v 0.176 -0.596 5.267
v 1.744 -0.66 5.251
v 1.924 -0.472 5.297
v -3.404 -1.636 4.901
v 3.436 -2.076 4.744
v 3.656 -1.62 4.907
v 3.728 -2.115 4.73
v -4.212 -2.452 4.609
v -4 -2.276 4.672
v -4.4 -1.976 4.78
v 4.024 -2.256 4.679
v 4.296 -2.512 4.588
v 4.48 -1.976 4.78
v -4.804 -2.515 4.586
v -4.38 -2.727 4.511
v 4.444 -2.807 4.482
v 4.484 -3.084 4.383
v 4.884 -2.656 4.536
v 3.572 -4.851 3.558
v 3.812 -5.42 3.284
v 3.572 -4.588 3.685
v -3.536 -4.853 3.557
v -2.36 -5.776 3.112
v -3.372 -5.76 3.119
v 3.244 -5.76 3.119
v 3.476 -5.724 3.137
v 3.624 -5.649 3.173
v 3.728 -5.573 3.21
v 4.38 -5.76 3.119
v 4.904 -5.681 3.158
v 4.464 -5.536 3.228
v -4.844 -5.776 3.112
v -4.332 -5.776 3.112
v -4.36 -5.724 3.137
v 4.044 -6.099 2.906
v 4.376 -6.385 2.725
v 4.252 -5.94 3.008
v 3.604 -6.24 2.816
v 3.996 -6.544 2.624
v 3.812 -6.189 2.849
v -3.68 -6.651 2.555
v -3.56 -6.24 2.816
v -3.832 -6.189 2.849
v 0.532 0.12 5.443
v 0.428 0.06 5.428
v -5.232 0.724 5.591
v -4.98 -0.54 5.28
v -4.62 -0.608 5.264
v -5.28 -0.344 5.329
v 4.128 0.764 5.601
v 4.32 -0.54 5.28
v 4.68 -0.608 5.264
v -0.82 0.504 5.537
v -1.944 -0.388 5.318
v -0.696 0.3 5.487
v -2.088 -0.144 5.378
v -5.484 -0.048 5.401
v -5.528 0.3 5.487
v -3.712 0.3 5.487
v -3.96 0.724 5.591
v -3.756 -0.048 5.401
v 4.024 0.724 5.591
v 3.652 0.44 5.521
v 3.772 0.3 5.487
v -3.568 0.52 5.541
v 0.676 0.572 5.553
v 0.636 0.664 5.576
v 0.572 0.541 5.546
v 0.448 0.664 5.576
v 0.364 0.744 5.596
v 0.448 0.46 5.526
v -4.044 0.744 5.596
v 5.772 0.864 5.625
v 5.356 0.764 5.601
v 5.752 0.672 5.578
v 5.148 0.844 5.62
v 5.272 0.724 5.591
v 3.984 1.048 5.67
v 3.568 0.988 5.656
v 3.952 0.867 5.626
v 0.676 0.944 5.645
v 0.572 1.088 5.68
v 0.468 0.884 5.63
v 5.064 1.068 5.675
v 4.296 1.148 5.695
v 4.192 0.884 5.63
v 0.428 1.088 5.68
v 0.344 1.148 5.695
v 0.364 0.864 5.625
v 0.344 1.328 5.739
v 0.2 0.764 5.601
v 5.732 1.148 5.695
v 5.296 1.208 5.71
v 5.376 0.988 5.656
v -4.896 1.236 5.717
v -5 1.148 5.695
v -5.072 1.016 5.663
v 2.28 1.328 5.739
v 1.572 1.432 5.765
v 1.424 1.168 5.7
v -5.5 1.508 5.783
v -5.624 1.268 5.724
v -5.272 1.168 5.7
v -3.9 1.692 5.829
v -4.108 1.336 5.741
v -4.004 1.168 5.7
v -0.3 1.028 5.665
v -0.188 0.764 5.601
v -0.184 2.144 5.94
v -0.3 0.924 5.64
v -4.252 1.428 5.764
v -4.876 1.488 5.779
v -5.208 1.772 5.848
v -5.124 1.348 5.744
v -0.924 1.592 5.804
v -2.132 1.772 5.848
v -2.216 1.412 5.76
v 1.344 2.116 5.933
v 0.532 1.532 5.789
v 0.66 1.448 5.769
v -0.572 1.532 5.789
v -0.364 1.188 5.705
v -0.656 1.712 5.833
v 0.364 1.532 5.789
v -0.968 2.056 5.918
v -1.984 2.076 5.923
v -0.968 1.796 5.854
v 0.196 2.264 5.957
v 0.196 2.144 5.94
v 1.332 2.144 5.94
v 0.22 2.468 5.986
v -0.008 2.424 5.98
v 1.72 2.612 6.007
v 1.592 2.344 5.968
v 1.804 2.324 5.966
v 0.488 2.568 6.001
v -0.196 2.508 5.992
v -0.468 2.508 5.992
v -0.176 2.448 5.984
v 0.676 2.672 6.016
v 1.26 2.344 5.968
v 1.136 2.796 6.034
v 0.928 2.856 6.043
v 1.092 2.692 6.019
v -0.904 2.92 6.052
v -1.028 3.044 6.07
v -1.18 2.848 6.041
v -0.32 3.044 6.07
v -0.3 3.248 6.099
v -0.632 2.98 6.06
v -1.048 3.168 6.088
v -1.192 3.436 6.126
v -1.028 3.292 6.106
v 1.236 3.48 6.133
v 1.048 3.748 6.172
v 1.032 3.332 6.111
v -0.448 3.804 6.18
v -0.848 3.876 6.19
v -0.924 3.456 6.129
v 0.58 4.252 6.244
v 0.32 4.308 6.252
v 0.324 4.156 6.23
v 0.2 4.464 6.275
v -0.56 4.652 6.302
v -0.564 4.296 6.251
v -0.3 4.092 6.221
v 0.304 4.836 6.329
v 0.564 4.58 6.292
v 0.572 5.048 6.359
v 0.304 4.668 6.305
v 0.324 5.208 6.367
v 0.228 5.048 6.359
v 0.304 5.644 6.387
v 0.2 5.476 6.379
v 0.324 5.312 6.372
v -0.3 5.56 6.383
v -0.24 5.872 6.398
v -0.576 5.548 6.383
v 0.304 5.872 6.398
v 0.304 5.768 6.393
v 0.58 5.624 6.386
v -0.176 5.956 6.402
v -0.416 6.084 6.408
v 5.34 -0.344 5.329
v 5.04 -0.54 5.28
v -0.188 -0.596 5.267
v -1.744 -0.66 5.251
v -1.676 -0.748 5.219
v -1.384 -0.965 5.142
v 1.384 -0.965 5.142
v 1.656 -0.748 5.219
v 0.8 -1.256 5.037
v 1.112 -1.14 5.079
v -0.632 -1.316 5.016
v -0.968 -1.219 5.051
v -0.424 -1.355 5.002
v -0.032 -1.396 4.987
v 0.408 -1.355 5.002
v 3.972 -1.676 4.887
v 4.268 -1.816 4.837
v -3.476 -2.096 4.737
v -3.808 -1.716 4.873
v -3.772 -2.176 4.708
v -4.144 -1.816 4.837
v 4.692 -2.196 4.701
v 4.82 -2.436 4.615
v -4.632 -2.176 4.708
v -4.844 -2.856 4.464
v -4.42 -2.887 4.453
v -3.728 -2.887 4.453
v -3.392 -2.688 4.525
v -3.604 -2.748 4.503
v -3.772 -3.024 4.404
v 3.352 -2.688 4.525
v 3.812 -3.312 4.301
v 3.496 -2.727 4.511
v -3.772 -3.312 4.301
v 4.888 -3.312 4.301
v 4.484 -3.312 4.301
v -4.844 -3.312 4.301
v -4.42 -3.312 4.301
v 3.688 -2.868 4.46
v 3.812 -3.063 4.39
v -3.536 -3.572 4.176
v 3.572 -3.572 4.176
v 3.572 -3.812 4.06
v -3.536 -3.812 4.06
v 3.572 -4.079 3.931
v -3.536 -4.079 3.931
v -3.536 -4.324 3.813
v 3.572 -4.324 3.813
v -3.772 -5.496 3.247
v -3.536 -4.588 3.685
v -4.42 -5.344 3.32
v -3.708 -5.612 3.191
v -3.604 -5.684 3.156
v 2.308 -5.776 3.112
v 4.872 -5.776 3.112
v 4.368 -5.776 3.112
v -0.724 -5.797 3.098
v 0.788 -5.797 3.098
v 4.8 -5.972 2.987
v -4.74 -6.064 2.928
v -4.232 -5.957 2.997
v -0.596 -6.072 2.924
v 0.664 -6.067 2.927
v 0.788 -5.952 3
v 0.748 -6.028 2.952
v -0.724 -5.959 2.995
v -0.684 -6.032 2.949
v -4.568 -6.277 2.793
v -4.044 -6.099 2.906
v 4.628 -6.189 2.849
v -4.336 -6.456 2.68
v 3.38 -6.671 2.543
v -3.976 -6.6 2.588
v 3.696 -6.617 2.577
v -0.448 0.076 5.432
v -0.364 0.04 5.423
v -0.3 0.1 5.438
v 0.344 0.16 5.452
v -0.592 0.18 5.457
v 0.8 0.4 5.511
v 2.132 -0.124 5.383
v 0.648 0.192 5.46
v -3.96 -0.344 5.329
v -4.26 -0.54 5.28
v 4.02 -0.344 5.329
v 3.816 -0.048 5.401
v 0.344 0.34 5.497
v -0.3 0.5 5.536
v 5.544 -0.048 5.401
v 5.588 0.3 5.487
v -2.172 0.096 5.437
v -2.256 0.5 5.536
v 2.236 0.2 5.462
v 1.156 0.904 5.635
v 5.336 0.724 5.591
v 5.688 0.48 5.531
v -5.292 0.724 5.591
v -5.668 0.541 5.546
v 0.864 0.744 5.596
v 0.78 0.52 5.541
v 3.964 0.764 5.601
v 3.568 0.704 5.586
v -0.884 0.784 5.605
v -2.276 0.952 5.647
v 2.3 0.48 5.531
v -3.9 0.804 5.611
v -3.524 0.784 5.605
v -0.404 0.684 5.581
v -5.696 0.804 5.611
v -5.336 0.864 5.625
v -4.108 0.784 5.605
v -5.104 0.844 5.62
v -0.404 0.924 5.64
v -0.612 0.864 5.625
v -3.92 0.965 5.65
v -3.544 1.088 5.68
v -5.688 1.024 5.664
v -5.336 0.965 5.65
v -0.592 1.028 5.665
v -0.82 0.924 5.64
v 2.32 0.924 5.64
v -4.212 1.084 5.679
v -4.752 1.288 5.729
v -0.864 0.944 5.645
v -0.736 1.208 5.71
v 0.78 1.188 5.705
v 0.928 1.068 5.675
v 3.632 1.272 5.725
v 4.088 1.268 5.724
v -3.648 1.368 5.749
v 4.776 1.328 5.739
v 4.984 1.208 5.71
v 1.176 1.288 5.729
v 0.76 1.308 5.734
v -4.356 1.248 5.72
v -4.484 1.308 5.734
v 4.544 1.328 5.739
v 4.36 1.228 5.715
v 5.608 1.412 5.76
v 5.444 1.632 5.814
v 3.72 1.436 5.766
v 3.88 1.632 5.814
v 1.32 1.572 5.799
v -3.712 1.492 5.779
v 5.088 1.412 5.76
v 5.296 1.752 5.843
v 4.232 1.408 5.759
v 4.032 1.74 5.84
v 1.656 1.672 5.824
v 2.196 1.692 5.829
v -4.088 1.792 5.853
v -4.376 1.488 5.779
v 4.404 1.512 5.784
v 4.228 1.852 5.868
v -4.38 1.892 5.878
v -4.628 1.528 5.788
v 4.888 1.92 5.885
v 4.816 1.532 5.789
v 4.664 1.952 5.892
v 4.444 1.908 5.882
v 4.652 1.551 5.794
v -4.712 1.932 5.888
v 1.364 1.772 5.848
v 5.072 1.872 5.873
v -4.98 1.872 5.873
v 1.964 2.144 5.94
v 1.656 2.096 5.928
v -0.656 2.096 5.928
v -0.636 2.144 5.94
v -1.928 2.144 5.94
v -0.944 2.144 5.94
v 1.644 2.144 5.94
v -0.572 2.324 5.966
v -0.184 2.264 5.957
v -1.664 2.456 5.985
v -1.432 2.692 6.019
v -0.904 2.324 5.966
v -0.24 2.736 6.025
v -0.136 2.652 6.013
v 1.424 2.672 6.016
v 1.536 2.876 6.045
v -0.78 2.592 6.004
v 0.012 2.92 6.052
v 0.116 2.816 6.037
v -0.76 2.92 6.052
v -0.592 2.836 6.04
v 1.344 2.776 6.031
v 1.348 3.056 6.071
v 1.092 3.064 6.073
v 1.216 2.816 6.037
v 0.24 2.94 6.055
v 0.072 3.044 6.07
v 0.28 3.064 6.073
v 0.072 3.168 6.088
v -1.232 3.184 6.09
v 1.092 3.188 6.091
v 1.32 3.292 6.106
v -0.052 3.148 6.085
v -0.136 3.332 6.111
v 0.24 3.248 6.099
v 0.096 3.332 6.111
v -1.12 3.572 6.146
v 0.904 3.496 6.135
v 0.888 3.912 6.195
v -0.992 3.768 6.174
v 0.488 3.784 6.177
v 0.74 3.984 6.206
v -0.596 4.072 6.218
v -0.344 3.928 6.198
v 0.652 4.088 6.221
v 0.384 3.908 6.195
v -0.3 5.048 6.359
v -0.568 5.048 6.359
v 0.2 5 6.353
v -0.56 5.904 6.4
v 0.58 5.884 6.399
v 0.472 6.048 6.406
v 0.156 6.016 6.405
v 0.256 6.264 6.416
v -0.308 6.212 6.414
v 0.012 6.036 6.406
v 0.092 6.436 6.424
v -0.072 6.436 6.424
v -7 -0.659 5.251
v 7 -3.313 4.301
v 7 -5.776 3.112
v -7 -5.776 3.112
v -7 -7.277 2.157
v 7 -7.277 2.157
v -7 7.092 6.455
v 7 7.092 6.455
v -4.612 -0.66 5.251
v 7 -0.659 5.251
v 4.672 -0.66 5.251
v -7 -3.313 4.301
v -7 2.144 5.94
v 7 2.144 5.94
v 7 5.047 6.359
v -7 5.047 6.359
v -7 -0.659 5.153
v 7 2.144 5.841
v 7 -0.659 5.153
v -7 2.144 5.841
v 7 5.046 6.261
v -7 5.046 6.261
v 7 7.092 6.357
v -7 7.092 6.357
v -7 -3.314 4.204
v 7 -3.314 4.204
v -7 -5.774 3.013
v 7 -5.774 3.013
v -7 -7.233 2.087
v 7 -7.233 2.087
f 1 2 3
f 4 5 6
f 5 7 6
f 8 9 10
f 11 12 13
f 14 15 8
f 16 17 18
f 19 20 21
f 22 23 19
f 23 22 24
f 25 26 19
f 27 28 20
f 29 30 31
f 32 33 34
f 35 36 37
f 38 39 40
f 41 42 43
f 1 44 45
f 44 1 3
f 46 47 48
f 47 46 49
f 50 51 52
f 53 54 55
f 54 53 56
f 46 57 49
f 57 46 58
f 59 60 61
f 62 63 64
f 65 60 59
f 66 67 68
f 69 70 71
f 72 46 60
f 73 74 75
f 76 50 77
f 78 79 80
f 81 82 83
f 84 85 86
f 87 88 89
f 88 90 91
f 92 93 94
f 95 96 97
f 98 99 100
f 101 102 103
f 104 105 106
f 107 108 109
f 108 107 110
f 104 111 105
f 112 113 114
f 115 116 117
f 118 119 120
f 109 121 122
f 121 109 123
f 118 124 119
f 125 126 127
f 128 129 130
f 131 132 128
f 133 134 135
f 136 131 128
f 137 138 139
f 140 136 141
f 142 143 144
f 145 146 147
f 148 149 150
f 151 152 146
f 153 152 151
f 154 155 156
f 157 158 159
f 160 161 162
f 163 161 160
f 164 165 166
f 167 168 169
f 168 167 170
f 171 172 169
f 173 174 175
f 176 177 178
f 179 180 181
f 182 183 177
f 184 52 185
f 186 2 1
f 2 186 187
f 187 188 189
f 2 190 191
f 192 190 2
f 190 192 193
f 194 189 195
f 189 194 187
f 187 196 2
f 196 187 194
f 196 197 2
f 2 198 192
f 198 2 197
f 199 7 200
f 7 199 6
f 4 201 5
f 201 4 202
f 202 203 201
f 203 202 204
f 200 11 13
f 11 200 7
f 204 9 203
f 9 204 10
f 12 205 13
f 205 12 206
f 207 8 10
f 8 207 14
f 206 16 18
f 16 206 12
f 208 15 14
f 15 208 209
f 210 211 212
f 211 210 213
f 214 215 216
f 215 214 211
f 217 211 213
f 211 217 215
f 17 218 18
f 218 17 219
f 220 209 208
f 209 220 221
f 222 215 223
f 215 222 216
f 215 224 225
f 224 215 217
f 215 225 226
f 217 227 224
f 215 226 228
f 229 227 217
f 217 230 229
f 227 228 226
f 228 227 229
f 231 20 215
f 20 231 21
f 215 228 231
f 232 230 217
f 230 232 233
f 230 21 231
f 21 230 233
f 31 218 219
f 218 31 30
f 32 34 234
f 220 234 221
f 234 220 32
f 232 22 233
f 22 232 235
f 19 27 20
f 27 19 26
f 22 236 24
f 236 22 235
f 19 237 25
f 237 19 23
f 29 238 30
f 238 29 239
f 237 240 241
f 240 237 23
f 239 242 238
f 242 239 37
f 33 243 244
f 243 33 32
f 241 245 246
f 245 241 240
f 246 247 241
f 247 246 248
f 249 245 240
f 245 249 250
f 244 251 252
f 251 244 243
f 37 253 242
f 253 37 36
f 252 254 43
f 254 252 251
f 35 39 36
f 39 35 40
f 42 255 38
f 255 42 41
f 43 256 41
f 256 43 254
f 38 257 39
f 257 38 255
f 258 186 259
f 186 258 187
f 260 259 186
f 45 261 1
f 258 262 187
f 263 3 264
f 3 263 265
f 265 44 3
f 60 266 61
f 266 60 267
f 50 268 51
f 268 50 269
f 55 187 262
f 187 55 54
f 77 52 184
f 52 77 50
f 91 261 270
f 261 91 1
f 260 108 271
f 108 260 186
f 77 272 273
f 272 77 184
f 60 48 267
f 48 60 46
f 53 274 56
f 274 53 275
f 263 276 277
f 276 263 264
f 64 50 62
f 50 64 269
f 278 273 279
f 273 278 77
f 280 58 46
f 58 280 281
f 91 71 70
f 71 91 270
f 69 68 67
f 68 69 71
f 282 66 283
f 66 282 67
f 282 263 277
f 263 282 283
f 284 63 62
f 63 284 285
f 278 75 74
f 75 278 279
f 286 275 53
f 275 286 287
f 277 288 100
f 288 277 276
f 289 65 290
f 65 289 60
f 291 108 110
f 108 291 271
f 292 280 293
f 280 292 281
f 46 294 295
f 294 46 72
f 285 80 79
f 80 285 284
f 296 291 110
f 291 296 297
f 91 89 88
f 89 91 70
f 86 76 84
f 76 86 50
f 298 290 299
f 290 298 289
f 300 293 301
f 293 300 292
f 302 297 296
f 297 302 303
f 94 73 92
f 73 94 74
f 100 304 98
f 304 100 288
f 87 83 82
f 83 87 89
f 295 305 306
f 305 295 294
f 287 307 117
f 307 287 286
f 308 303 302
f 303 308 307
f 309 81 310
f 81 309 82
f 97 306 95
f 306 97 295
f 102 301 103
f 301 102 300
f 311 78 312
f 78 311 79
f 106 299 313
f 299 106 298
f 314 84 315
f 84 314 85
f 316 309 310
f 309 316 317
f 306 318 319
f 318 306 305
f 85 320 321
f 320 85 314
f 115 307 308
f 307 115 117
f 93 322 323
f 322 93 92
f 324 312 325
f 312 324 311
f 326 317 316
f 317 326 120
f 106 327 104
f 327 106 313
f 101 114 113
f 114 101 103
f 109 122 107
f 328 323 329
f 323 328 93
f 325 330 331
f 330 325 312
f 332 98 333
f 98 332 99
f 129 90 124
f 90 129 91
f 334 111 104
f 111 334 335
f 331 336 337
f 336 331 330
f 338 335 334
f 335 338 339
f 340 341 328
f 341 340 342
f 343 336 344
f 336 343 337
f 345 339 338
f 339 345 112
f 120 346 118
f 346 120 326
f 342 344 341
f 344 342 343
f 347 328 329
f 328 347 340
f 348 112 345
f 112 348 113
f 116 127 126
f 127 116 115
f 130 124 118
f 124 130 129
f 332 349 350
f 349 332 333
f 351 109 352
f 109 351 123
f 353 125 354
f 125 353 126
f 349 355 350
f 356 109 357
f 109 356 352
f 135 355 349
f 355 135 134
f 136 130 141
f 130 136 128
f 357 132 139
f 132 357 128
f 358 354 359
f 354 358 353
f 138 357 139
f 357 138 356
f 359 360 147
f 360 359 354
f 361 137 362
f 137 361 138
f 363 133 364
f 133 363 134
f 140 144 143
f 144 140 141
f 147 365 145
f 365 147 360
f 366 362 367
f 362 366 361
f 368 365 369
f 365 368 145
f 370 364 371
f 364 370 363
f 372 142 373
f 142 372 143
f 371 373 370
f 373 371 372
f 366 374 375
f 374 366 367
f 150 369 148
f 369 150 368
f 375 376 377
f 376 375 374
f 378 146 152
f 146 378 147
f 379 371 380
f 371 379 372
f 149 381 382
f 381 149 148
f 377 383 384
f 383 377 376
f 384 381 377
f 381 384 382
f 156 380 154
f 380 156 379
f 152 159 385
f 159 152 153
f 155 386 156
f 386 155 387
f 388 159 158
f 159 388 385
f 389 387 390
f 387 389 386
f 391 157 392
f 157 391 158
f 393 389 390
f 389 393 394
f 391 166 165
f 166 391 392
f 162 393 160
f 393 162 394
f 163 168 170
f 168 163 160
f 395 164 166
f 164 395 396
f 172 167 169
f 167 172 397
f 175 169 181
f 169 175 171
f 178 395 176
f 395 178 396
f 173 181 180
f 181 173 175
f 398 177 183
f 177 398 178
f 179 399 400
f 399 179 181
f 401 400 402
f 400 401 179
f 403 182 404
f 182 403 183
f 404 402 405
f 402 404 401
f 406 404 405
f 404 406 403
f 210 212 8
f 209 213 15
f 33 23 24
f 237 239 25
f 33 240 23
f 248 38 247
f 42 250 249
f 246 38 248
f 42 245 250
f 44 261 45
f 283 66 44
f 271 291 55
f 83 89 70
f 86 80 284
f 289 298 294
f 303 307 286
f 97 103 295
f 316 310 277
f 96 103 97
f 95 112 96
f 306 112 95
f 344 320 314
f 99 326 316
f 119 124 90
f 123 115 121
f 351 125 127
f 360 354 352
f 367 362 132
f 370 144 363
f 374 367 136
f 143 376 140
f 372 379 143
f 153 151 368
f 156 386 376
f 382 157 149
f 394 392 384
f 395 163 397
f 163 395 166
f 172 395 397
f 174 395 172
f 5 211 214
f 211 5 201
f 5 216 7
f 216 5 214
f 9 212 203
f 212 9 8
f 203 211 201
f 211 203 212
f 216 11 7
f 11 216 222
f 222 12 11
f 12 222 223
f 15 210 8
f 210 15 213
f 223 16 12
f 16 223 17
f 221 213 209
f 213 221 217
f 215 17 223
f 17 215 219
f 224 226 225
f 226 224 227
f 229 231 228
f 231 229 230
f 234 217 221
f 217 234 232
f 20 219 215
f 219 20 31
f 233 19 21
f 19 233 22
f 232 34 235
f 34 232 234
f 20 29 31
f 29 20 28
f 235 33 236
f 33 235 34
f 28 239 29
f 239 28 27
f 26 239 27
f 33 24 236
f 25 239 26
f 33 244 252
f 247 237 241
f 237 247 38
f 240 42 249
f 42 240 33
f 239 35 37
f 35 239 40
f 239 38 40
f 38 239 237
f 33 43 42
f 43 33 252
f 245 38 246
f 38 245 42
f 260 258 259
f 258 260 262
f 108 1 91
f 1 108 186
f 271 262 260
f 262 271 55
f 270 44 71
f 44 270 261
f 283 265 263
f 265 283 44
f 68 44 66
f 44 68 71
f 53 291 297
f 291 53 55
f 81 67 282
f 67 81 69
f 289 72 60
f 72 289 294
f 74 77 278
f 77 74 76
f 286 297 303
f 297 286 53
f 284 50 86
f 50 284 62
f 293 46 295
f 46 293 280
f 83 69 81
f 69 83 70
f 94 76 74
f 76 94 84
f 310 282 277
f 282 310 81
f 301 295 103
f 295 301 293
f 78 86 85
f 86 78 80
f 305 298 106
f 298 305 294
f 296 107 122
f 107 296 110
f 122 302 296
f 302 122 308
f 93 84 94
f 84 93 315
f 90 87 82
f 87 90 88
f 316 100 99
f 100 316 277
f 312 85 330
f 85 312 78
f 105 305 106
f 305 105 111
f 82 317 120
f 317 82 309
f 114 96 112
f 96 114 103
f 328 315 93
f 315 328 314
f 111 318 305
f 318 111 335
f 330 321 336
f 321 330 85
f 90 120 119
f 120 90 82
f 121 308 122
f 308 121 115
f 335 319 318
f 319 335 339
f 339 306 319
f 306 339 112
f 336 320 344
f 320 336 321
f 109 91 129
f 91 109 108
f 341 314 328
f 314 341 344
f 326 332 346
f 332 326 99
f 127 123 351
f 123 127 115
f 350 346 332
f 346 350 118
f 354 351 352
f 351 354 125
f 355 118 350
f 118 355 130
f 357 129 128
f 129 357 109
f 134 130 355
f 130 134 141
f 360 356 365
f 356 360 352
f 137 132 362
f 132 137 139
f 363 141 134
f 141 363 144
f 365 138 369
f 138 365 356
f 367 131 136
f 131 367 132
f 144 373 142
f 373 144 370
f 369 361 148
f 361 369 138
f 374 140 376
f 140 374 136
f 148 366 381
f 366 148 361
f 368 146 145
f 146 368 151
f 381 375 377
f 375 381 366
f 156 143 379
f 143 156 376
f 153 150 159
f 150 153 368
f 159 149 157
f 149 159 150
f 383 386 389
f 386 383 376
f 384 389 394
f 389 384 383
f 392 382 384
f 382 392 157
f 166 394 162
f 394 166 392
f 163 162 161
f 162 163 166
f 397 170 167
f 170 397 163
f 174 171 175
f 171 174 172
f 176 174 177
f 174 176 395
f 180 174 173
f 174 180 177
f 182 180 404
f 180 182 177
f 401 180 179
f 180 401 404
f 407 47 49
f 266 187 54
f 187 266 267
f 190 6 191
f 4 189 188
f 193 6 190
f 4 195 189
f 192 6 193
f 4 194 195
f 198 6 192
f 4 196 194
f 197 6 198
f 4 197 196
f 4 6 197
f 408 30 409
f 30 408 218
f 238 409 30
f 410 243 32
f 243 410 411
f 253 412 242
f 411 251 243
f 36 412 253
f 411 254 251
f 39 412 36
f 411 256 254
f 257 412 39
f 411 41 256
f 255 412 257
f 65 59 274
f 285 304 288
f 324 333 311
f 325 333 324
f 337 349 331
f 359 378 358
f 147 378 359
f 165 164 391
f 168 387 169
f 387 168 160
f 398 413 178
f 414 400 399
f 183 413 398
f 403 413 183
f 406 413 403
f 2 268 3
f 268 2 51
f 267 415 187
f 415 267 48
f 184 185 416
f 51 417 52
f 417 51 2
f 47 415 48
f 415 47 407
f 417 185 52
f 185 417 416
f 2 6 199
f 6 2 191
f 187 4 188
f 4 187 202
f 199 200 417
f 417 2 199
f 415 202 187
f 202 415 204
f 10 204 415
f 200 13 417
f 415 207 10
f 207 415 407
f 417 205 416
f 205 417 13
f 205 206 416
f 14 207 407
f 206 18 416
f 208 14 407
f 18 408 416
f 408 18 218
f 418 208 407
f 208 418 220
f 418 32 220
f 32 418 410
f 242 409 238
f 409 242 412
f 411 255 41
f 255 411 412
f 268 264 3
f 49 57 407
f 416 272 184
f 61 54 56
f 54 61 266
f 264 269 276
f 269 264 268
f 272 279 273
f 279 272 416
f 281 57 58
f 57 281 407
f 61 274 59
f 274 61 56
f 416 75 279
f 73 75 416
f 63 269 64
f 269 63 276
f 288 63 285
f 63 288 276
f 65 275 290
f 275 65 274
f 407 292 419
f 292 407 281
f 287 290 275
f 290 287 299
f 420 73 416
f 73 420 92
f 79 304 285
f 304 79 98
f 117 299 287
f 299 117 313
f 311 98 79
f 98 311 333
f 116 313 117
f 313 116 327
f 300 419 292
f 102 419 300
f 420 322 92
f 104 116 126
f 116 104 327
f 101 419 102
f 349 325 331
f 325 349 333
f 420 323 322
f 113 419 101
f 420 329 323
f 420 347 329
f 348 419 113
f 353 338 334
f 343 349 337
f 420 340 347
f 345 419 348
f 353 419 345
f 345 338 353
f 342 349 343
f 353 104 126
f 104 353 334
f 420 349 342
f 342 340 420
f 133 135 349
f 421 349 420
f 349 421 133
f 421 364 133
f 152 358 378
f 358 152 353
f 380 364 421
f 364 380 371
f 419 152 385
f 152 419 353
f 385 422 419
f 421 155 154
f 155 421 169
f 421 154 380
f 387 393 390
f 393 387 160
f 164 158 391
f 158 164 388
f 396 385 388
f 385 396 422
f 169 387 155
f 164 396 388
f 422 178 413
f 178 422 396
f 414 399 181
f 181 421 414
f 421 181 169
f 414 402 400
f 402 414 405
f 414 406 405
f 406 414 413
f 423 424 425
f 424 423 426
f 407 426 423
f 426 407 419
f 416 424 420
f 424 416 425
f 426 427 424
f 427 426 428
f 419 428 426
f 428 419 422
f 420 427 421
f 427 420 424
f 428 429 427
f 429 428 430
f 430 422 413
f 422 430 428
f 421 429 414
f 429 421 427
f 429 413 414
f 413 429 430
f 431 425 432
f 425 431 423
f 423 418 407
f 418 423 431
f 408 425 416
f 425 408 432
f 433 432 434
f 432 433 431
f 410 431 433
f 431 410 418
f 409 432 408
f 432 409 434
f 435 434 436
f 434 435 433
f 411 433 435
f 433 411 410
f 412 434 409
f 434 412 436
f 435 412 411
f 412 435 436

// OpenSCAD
use <../lib.scad>
use <s/6296256dc01s01.scad>
function ldraw_lib__6372023dc01() = [
// 0 Sticker  1.9 x  1.8 with Ignition Key, Switches and Ashtray on Bright Light Blue (Formed)
// 0 Name: 6372023dc01.dat
// 0 Author: Magnus Forsberg [MagFors]
// 0 !LDRAW_ORG Part UPDATE 2024-05
// 0 !LICENSE Licensed under CC BY 4.0 : see CAreadme.txt
// 
// 0 BFC CERTIFY CCW
  [0,"BFC","CERTIFY"],
  [0,"BFC","CCW"],
// 
// 0 !KEYWORDS 500, Bricklink 77942stk01, Brickowl 1064764, Cinquecento, FIAT
// 0 !KEYWORDS Nuova, Rebrickable 83460, set 77942
// 
// 0 !HISTORY 2024-06-30 [OrionP] Official Update 2024-05
// 
// 
// 1 212 0 0 0 1 0 0 0 1 0 0 0 1 s\6296256dc01s01.dat
  [1,212,0,0,0,1,0,0,0,1,0,0,0,1, ldraw_lib__s__6296256dc01s01()],
// 0 // backside
// 4 16 -17.5 -12.8827 -1.648 -17.5 -14.6036 5.36 17.5 -14.6036 5.36 17.5 -12.8827 -1.648
  [4,16,-17.5,-12.8827,-1.648,-17.5,-14.6036,5.36,17.5,-14.6036,5.36,17.5,-12.8827,-1.648],
// 4 16 -17.5 -12.8827 -1.648 -17.5 -13.1279 -1.648 -17.5 -14.8489 5.36 -17.5 -14.6036 5.36
  [4,16,-17.5,-12.8827,-1.648,-17.5,-13.1279,-1.648,-17.5,-14.8489,5.36,-17.5,-14.6036,5.36],
// 4 16 17.5 -13.1279 -1.648 17.5 -12.8827 -1.648 17.5 -14.6036 5.36 17.5 -14.8489 5.36
  [4,16,17.5,-13.1279,-1.648,17.5,-12.8827,-1.648,17.5,-14.6036,5.36,17.5,-14.8489,5.36],
// 4 16 17.5 -14.6036 5.36 -17.5 -14.6036 5.36 -17.5 -15.6524 12.616 17.5 -15.6524 12.616
  [4,16,17.5,-14.6036,5.36,-17.5,-14.6036,5.36,-17.5,-15.6524,12.616,17.5,-15.6524,12.616],
// 4 16 -17.5 -14.6036 5.36 -17.5 -14.8489 5.36 -17.5 -15.8985 12.618 -17.5 -15.6524 12.616
  [4,16,-17.5,-14.6036,5.36,-17.5,-14.8489,5.36,-17.5,-15.8985,12.618,-17.5,-15.6524,12.616],
// 4 16 17.5 -14.8489 5.36 17.5 -14.6036 5.36 17.5 -15.6524 12.616 17.5 -15.8985 12.618
  [4,16,17.5,-14.8489,5.36,17.5,-14.6036,5.36,17.5,-15.6524,12.616,17.5,-15.8985,12.618],
// 4 16 -17.5 -15.6524 12.616 -17.5 -15.8932 17.7298 17.5 -15.8932 17.7298 17.5 -15.6524 12.616
  [4,16,-17.5,-15.6524,12.616,-17.5,-15.8932,17.7298,17.5,-15.8932,17.7298,17.5,-15.6524,12.616],
// 4 16 -17.5 -15.6524 12.616 -17.5 -15.8985 12.618 -17.5 -16.1379 17.7301 -17.5 -15.8932 17.7298
  [4,16,-17.5,-15.6524,12.616,-17.5,-15.8985,12.618,-17.5,-16.1379,17.7301,-17.5,-15.8932,17.7298],
// 4 16 17.5 -15.8985 12.618 17.5 -15.6524 12.616 17.5 -15.8932 17.7298 17.5 -16.1379 17.7301
  [4,16,17.5,-15.8985,12.618,17.5,-15.6524,12.616,17.5,-15.8932,17.7298,17.5,-16.1379,17.7301],
// 4 16 -17.5 -16.1379 17.7301 17.5 -16.1379 17.7301 17.5 -15.8932 17.7298 -17.5 -15.8932 17.7298
  [4,16,-17.5,-16.1379,17.7301,17.5,-16.1379,17.7301,17.5,-15.8932,17.7298,-17.5,-15.8932,17.7298],
// 4 16 17.5 -12.8827 -1.648 17.5 -10.5099 -8.284 -17.5 -10.5099 -8.284 -17.5 -12.8827 -1.648
  [4,16,17.5,-12.8827,-1.648,17.5,-10.5099,-8.284,-17.5,-10.5099,-8.284,-17.5,-12.8827,-1.648],
// 4 16 -17.5 -12.8827 -1.648 -17.5 -10.5099 -8.284 -17.5 -10.7525 -8.282 -17.5 -13.1279 -1.648
  [4,16,-17.5,-12.8827,-1.648,-17.5,-10.5099,-8.284,-17.5,-10.7525,-8.282,-17.5,-13.1279,-1.648],
// 4 16 17.5 -13.1279 -1.648 17.5 -10.7525 -8.282 17.5 -10.5099 -8.284 17.5 -12.8827 -1.648
  [4,16,17.5,-13.1279,-1.648,17.5,-10.7525,-8.282,17.5,-10.5099,-8.284,17.5,-12.8827,-1.648],
// 4 16 -17.5 -10.5099 -8.284 17.5 -10.5099 -8.284 17.5 -7.5316 -14.436 -17.5 -7.5316 -14.436
  [4,16,-17.5,-10.5099,-8.284,17.5,-10.5099,-8.284,17.5,-7.5316,-14.436,-17.5,-7.5316,-14.436],
// 4 16 -17.5 -10.7525 -8.282 -17.5 -10.5099 -8.284 -17.5 -7.5316 -14.436 -17.5 -7.7789 -14.44
  [4,16,-17.5,-10.7525,-8.282,-17.5,-10.5099,-8.284,-17.5,-7.5316,-14.436,-17.5,-7.7789,-14.44],
// 4 16 17.5 -10.5099 -8.284 17.5 -10.7525 -8.282 17.5 -7.7789 -14.44 17.5 -7.5316 -14.436
  [4,16,17.5,-10.5099,-8.284,17.5,-10.7525,-8.282,17.5,-7.7789,-14.44,17.5,-7.5316,-14.436],
// 4 16 -17.5 -7.5316 -14.436 17.5 -7.5316 -14.436 17.5 -5.2174 -18.0819 -17.5 -5.2174 -18.0819
  [4,16,-17.5,-7.5316,-14.436,17.5,-7.5316,-14.436,17.5,-5.2174,-18.0819,-17.5,-5.2174,-18.0819],
// 4 16 -17.5 -7.7789 -14.44 -17.5 -7.5316 -14.436 -17.5 -5.2174 -18.0819 -17.5 -5.3931 -18.1936
  [4,16,-17.5,-7.7789,-14.44,-17.5,-7.5316,-14.436,-17.5,-5.2174,-18.0819,-17.5,-5.3931,-18.1936],
// 4 16 17.5 -7.5316 -14.436 17.5 -7.7789 -14.44 17.5 -5.3931 -18.1936 17.5 -5.2174 -18.0819
  [4,16,17.5,-7.5316,-14.436,17.5,-7.7789,-14.44,17.5,-5.3931,-18.1936,17.5,-5.2174,-18.0819],
// 4 16 -17.5 -5.3931 -18.1936 -17.5 -5.2174 -18.0819 17.5 -5.2174 -18.0819 17.5 -5.3931 -18.1936
  [4,16,-17.5,-5.3931,-18.1936,-17.5,-5.2174,-18.0819,17.5,-5.2174,-18.0819,17.5,-5.3931,-18.1936],
// 5 24 17.5 -15.8985 12.618 -17.5 -15.8985 12.618 17.5 -16.1379 17.7301 17.5 -14.8489 5.36
  [5,24,17.5,-15.8985,12.618,-17.5,-15.8985,12.618,17.5,-16.1379,17.7301,17.5,-14.8489,5.36],
// 5 24 17.5 -14.8489 5.36 -17.5 -14.8489 5.36 17.5 -15.8985 12.618 17.5 -13.1279 -1.648
  [5,24,17.5,-14.8489,5.36,-17.5,-14.8489,5.36,17.5,-15.8985,12.618,17.5,-13.1279,-1.648],
// 5 24 17.5 -13.1279 -1.648 -17.5 -13.1279 -1.648 17.5 -14.8489 5.36 17.5 -10.7525 -8.282
  [5,24,17.5,-13.1279,-1.648,-17.5,-13.1279,-1.648,17.5,-14.8489,5.36,17.5,-10.7525,-8.282],
// 5 24 17.5 -10.7525 -8.282 -17.5 -10.7525 -8.282 17.5 -13.1279 -1.648 17.5 -7.7789 -14.44
  [5,24,17.5,-10.7525,-8.282,-17.5,-10.7525,-8.282,17.5,-13.1279,-1.648,17.5,-7.7789,-14.44],
// 5 24 17.5 -7.7789 -14.44 -17.5 -7.7789 -14.44 17.5 -10.7525 -8.282 17.5 -5.3931 -18.1936
  [5,24,17.5,-7.7789,-14.44,-17.5,-7.7789,-14.44,17.5,-10.7525,-8.282,17.5,-5.3931,-18.1936],
// 5 24 17.5 -15.6524 12.616 -17.5 -15.6524 12.616 17.5 -15.8932 17.7298 17.5 -14.6036 5.36
  [5,24,17.5,-15.6524,12.616,-17.5,-15.6524,12.616,17.5,-15.8932,17.7298,17.5,-14.6036,5.36],
// 5 24 17.5 -14.6036 5.36 -17.5 -14.6036 5.36 17.5 -15.6524 12.616 17.5 -12.8827 -1.648
  [5,24,17.5,-14.6036,5.36,-17.5,-14.6036,5.36,17.5,-15.6524,12.616,17.5,-12.8827,-1.648],
// 5 24 17.5 -12.8827 -1.648 -17.5 -12.8827 -1.648 17.5 -14.6036 5.36 17.5 -10.5099 -8.284
  [5,24,17.5,-12.8827,-1.648,-17.5,-12.8827,-1.648,17.5,-14.6036,5.36,17.5,-10.5099,-8.284],
// 5 24 17.5 -10.5099 -8.284 -17.5 -10.5099 -8.284 17.5 -12.8827 -1.648 17.5 -7.5316 -14.436
  [5,24,17.5,-10.5099,-8.284,-17.5,-10.5099,-8.284,17.5,-12.8827,-1.648,17.5,-7.5316,-14.436],
// 5 24 17.5 -7.5316 -14.436 -17.5 -7.5316 -14.436 17.5 -10.5099 -8.284 17.5 -5.2174 -18.0819
  [5,24,17.5,-7.5316,-14.436,-17.5,-7.5316,-14.436,17.5,-10.5099,-8.284,17.5,-5.2174,-18.0819],
];
module ldraw_lib__6372023dc01(step=0, col=false, unit=2/5, alt=false, line=0.2, solid=!$preview)
    makepoly(ldraw_lib__6372023dc01(), step=step, col=col, unit=unit, alt=alt, line=line, solid=solid);
ldraw_lib__6372023dc01(line=0.2);
